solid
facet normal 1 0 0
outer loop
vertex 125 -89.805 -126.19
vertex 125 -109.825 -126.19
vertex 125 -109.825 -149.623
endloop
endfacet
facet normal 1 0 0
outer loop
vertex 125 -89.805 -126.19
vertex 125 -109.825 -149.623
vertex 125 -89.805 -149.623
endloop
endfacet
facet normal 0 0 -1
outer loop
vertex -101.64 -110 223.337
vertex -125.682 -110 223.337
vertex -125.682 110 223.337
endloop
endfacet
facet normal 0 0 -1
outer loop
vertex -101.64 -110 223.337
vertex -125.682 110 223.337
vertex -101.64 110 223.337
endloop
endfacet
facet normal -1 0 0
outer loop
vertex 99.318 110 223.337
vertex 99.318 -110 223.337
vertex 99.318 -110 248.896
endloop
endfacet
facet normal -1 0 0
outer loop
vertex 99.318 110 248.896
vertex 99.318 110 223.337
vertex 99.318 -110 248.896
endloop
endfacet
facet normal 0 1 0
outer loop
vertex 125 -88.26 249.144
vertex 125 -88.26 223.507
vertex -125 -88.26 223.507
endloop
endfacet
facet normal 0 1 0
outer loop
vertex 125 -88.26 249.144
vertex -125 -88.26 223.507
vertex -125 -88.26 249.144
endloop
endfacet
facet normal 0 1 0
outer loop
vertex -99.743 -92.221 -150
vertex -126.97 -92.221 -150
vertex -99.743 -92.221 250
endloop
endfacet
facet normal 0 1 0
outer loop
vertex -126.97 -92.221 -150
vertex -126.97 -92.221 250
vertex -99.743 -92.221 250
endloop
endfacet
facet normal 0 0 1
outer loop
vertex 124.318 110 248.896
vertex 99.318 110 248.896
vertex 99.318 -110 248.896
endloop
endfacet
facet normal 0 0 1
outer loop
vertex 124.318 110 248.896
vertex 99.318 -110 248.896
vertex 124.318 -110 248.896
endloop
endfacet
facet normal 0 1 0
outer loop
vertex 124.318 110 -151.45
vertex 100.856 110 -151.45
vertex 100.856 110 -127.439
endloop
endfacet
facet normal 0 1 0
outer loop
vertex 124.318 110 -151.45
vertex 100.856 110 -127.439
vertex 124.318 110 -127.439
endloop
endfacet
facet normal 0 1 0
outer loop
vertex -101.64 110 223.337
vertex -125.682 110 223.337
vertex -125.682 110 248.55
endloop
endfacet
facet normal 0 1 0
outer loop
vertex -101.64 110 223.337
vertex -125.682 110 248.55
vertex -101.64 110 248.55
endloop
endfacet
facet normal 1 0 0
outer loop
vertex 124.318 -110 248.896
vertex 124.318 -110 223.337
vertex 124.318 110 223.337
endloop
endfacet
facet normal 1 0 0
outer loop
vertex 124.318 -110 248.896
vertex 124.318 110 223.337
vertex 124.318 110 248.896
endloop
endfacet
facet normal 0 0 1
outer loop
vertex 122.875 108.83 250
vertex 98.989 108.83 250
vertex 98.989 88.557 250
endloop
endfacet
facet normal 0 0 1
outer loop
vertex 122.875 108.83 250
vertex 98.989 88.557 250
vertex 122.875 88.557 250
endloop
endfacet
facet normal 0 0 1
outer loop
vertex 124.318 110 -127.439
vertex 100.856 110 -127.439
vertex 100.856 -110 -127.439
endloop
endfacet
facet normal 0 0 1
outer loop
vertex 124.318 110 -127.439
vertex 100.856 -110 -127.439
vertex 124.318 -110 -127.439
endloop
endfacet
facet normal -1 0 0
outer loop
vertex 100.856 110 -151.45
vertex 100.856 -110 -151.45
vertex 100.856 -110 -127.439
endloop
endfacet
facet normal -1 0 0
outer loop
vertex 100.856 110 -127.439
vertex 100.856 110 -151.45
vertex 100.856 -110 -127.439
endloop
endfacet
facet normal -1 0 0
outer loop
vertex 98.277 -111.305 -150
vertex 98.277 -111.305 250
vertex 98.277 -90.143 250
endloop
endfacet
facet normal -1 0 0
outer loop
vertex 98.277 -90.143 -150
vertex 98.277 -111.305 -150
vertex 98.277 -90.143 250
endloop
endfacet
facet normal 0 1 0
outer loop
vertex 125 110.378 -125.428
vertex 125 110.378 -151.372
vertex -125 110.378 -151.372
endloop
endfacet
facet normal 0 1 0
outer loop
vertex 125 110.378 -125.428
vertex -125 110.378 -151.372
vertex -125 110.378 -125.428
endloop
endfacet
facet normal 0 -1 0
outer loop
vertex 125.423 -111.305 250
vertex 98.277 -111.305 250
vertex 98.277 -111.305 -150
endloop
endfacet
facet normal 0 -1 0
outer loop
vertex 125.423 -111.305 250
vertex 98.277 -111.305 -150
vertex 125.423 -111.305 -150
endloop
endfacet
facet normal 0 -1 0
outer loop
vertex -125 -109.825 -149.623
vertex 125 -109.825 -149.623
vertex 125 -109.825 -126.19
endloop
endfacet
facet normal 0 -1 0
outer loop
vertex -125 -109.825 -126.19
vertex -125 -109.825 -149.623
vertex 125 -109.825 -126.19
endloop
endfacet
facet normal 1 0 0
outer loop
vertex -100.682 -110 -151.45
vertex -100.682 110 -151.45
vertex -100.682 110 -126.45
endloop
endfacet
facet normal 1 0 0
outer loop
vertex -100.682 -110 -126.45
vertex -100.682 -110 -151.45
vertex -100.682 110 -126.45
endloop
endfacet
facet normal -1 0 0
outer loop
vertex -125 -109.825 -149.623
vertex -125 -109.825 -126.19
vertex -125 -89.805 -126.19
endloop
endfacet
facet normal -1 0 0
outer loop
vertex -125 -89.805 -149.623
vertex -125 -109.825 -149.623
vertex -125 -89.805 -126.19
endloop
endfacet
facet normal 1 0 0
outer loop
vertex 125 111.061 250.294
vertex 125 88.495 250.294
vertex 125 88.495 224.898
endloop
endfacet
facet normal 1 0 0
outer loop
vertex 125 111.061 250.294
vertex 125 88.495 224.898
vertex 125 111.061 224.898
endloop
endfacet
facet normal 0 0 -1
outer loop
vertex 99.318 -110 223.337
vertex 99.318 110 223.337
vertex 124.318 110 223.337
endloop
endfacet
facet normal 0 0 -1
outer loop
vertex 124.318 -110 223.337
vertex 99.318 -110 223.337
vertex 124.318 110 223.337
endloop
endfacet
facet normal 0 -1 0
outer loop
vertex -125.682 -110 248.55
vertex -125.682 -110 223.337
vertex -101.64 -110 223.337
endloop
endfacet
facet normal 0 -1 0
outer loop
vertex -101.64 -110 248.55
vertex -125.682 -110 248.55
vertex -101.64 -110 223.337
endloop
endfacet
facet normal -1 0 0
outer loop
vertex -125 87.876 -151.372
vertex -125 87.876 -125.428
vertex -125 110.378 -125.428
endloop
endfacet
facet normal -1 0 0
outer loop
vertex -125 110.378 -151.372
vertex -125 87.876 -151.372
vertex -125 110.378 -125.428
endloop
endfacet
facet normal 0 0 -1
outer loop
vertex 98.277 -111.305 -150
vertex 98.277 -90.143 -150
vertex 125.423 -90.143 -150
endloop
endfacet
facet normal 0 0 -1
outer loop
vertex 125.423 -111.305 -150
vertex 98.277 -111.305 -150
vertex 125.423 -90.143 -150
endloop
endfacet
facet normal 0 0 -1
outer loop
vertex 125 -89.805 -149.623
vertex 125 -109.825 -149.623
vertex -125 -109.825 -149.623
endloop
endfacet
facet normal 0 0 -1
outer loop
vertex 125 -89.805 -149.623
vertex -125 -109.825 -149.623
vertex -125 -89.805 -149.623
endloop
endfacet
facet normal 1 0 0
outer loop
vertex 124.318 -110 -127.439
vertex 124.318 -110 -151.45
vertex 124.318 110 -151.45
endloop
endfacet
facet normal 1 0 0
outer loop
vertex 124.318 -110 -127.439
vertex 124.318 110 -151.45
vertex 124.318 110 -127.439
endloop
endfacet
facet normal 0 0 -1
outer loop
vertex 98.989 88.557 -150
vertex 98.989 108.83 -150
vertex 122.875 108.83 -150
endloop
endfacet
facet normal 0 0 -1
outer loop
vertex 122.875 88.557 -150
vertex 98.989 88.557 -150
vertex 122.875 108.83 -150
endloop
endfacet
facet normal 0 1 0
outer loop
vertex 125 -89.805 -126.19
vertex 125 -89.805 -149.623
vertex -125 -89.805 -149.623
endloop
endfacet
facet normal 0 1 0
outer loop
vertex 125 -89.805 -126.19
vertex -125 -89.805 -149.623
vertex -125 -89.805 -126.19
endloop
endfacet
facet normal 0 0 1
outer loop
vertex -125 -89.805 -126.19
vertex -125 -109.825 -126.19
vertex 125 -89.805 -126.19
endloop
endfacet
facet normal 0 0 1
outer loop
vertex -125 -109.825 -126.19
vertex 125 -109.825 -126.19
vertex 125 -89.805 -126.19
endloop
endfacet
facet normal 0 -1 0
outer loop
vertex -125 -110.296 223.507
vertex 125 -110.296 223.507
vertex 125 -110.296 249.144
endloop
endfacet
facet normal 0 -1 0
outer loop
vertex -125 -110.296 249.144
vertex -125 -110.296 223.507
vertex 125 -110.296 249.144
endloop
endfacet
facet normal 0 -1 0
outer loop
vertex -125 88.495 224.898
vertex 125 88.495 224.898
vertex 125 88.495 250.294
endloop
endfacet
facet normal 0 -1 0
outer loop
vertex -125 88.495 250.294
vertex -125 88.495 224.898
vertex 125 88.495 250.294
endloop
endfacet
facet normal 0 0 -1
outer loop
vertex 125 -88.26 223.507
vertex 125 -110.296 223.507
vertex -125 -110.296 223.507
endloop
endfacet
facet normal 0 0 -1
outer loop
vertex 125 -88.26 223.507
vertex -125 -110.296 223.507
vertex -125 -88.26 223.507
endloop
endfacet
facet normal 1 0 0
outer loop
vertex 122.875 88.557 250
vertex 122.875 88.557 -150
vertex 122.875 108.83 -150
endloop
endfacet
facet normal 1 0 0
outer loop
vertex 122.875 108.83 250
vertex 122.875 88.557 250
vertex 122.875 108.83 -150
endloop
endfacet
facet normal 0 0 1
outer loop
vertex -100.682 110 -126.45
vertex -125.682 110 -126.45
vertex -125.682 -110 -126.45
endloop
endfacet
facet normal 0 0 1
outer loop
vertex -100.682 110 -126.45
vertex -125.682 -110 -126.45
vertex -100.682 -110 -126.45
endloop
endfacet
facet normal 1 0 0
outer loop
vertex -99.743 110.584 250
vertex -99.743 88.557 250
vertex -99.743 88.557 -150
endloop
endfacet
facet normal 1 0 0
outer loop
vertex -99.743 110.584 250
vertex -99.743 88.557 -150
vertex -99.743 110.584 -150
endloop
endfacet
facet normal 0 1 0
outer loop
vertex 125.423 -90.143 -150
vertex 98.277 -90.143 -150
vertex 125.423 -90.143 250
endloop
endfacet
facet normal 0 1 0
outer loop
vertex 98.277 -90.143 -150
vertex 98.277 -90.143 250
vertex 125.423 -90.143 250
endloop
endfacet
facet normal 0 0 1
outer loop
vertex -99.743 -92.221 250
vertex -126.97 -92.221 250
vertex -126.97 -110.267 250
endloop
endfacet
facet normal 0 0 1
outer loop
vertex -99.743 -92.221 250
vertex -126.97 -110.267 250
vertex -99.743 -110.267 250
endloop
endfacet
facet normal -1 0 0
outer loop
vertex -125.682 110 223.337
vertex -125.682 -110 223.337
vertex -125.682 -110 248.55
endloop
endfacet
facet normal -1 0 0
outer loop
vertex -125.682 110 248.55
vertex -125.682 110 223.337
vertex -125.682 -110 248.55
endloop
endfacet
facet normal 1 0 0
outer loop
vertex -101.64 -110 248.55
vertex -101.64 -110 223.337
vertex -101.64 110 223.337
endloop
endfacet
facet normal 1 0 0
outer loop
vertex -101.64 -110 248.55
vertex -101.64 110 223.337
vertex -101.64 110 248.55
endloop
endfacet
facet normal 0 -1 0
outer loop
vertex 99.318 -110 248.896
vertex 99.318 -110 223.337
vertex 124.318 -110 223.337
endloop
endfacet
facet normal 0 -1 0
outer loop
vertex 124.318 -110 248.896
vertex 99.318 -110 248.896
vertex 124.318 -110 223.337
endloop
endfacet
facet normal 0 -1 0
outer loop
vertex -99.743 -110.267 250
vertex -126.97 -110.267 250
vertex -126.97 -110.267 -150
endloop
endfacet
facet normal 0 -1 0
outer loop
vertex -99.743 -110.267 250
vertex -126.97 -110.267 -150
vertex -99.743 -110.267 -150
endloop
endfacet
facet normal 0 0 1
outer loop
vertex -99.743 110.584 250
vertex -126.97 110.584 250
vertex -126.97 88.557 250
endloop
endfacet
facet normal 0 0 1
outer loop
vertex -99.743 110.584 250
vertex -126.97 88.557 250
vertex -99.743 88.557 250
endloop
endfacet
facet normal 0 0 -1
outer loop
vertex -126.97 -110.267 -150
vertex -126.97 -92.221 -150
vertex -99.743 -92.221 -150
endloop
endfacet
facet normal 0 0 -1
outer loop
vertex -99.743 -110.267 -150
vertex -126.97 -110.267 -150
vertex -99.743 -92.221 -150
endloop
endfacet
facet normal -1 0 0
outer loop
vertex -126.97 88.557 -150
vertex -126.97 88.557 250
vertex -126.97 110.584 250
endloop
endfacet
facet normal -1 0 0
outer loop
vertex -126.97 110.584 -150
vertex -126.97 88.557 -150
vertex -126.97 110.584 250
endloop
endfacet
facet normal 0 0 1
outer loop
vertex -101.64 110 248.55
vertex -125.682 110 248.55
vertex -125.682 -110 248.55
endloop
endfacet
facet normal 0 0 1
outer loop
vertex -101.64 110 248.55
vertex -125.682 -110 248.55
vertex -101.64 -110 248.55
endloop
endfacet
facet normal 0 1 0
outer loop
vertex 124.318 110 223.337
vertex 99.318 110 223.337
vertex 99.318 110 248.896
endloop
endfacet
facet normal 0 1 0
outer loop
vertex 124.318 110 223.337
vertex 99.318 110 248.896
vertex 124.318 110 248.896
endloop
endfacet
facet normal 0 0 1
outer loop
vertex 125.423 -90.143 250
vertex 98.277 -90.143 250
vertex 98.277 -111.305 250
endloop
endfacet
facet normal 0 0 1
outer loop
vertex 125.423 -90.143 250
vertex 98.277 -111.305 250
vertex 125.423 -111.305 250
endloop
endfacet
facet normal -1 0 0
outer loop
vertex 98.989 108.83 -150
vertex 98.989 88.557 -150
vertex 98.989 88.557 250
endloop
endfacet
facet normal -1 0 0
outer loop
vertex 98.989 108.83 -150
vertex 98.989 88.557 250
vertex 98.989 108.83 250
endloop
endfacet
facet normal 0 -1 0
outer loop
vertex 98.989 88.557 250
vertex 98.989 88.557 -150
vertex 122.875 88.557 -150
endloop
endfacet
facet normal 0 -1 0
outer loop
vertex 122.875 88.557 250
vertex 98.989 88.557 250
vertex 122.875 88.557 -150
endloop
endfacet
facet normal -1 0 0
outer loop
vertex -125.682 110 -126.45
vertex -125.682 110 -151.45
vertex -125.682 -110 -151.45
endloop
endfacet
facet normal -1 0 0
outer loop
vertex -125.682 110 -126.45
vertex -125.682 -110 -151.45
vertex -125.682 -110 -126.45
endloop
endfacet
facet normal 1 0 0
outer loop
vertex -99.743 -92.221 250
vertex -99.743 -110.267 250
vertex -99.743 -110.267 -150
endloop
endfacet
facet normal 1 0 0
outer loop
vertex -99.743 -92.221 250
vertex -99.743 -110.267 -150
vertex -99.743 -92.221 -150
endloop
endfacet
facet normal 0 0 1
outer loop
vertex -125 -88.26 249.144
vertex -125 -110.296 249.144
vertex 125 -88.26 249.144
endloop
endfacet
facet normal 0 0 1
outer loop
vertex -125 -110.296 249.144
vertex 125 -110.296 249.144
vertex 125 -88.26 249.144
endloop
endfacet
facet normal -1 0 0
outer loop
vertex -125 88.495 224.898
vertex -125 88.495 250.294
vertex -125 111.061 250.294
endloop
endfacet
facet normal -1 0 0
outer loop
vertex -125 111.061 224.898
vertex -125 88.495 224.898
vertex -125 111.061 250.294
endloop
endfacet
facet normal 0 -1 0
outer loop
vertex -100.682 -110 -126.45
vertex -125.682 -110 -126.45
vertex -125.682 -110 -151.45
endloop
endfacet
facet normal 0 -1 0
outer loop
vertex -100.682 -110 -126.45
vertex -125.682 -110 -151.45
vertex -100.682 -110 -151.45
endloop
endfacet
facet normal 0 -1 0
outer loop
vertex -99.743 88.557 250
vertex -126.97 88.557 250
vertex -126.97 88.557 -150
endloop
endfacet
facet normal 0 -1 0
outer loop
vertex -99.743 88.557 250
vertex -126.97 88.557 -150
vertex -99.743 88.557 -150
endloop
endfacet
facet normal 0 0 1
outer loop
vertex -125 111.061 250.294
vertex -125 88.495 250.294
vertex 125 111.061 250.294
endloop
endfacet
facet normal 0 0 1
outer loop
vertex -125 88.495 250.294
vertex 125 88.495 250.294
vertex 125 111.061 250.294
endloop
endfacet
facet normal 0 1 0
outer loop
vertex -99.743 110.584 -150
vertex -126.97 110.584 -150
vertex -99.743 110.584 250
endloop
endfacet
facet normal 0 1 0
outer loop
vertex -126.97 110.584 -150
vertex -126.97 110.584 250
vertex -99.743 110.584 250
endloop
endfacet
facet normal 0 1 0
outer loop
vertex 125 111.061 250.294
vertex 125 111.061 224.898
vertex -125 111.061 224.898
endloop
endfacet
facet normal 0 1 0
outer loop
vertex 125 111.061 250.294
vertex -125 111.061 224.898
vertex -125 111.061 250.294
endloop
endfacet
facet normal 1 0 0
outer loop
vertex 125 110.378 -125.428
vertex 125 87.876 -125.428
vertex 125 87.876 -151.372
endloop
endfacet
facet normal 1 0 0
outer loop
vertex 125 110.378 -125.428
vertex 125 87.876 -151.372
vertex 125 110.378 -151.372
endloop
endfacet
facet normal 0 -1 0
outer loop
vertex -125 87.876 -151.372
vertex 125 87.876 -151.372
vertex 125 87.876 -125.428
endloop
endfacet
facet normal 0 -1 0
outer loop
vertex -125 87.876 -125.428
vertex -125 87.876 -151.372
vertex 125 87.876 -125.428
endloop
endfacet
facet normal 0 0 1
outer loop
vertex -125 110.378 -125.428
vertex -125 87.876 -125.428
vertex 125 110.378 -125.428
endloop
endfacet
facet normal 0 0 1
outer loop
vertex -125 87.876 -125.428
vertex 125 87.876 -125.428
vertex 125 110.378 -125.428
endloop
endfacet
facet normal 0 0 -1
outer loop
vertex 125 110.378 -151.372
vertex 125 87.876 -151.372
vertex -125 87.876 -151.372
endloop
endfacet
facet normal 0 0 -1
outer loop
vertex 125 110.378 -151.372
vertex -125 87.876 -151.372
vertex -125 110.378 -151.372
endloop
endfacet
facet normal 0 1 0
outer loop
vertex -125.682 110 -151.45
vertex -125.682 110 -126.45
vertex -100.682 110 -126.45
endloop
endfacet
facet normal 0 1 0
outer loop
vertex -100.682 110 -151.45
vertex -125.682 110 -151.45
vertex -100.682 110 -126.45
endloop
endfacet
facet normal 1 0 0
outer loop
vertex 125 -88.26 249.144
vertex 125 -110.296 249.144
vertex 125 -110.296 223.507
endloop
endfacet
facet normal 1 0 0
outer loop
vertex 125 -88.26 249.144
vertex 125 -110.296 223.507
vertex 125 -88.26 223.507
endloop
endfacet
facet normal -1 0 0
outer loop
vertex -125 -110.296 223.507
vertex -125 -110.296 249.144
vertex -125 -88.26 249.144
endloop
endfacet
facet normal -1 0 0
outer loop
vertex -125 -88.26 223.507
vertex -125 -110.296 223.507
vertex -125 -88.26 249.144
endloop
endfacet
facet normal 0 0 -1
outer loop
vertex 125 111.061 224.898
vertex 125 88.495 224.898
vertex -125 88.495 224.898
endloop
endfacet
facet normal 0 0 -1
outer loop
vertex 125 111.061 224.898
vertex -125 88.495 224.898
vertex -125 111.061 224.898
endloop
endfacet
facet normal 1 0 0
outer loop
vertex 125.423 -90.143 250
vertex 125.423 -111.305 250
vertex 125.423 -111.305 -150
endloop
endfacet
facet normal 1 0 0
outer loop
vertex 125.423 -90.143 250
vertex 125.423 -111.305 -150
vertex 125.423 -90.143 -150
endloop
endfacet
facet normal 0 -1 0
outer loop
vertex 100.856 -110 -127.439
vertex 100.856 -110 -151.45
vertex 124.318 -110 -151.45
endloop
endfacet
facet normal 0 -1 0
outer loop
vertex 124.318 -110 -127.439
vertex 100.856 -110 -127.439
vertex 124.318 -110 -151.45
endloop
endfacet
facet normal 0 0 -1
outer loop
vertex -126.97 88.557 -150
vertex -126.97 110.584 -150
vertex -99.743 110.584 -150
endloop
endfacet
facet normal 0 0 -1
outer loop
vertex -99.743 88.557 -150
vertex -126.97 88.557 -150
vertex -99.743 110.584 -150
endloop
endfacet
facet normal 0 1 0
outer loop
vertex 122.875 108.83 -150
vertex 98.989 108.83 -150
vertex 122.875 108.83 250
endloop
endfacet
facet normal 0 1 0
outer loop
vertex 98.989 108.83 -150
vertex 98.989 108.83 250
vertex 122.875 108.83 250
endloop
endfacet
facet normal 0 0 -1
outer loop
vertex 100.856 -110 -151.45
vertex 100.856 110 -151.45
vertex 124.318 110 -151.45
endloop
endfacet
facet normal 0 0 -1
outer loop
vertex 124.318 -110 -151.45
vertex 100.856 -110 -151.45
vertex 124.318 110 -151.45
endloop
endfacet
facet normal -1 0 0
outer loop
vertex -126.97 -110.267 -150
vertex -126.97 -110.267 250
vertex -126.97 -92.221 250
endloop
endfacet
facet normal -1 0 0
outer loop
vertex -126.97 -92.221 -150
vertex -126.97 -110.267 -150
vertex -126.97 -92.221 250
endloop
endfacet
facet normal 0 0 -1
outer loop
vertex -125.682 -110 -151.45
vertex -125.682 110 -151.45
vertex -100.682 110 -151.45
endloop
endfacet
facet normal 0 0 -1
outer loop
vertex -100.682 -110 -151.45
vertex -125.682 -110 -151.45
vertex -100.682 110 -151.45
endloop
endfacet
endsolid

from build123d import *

# Parameters (mm, degrees)
F1_W          = 25
F1_H          = 25.558808
F1_W_2        = 24.041814
F1_H_2        = 25.213313
F1_W_3        = 23.461955
F1_H_3        = 24.010879
F1_H_4        = 25
F2_DEPTH      = 110
F2_DEPTH_BACK = 110
F3_W          = 27.227469
F3_H          = 22.026211
F3_W_2        = 23.886204
F3_H_2        = 20.272776
F3_W_3        = 27.146042
F3_H_3        = 21.162175
F3_H_4        = 18.046282
F4_DEPTH      = 250
F4_DEPTH_BACK = 150
F5_W          = 22.501841
F5_H          = 25.943548
F5_W_2        = 22.565842
F5_H_2        = 25.395974
F5_W_3        = 20.019822
F5_H_3        = 23.433119
F5_W_4        = 22.03574
F5_H_4        = 25.63703
F6_DEPTH      = 125
F6_DEPTH_BACK = 125


with BuildPart() as f2:
    # F1 (on face) → F2 (new body, two sides)
    with BuildSketch(Plane.XZ) as f2_sk:
        with Locations((111.81776, 236.116279)):
            Rectangle(F1_W, F1_H)
        with Locations((-113.661333, 235.943532)):
            Rectangle(F1_W_2, F1_H_2)
        with Locations((112.586782, -139.444372)):
            Rectangle(F1_W_3, F1_H_3)
        with Locations((-113.18224, -138.949812)):
            Rectangle(F1_W, F1_H_4)
    extrude(amount=F2_DEPTH)
    extrude(f2_sk.sketch, amount=-F2_DEPTH_BACK)


with BuildPart() as f4:
    # F3 (on Top) → F4 (new body, two sides)
    with BuildSketch(Plane.XY) as f4_sk:
        with Locations((-113.356497, 99.570536)):
            Rectangle(F3_W, F3_H)
        with Locations((110.932022, 98.693818)):
            Rectangle(F3_W_2, F3_H_2)
        with Locations((111.84977, -100.724187)):
            Rectangle(F3_W_3, F3_H_3)
        with Locations((-113.356497, -101.244222)):
            Rectangle(F3_W, F3_H_4)
    extrude(amount=F4_DEPTH)
    extrude(f4_sk.sketch, amount=-F4_DEPTH_BACK)


with BuildPart() as f6:
    # F5 (on Right) → F6 (new body, two sides)
    with BuildSketch(Plane.YZ) as f6_sk:
        with Locations((99.127353, -138.399765)):
            Rectangle(F5_W, F5_H)
        with Locations((99.777639, 237.595625)):
            Rectangle(F5_W_2, F5_H_2)
        with Locations((-99.815253, -137.906774)):
            Rectangle(F5_W_3, F5_H_3)
        with Locations((-99.277768, 236.325413)):
            Rectangle(F5_W_4, F5_H_4)
    extrude(amount=F6_DEPTH)
    extrude(f6_sk.sketch, amount=-F6_DEPTH_BACK)


solid = Compound([f2.part, f4.part, f6.part])
